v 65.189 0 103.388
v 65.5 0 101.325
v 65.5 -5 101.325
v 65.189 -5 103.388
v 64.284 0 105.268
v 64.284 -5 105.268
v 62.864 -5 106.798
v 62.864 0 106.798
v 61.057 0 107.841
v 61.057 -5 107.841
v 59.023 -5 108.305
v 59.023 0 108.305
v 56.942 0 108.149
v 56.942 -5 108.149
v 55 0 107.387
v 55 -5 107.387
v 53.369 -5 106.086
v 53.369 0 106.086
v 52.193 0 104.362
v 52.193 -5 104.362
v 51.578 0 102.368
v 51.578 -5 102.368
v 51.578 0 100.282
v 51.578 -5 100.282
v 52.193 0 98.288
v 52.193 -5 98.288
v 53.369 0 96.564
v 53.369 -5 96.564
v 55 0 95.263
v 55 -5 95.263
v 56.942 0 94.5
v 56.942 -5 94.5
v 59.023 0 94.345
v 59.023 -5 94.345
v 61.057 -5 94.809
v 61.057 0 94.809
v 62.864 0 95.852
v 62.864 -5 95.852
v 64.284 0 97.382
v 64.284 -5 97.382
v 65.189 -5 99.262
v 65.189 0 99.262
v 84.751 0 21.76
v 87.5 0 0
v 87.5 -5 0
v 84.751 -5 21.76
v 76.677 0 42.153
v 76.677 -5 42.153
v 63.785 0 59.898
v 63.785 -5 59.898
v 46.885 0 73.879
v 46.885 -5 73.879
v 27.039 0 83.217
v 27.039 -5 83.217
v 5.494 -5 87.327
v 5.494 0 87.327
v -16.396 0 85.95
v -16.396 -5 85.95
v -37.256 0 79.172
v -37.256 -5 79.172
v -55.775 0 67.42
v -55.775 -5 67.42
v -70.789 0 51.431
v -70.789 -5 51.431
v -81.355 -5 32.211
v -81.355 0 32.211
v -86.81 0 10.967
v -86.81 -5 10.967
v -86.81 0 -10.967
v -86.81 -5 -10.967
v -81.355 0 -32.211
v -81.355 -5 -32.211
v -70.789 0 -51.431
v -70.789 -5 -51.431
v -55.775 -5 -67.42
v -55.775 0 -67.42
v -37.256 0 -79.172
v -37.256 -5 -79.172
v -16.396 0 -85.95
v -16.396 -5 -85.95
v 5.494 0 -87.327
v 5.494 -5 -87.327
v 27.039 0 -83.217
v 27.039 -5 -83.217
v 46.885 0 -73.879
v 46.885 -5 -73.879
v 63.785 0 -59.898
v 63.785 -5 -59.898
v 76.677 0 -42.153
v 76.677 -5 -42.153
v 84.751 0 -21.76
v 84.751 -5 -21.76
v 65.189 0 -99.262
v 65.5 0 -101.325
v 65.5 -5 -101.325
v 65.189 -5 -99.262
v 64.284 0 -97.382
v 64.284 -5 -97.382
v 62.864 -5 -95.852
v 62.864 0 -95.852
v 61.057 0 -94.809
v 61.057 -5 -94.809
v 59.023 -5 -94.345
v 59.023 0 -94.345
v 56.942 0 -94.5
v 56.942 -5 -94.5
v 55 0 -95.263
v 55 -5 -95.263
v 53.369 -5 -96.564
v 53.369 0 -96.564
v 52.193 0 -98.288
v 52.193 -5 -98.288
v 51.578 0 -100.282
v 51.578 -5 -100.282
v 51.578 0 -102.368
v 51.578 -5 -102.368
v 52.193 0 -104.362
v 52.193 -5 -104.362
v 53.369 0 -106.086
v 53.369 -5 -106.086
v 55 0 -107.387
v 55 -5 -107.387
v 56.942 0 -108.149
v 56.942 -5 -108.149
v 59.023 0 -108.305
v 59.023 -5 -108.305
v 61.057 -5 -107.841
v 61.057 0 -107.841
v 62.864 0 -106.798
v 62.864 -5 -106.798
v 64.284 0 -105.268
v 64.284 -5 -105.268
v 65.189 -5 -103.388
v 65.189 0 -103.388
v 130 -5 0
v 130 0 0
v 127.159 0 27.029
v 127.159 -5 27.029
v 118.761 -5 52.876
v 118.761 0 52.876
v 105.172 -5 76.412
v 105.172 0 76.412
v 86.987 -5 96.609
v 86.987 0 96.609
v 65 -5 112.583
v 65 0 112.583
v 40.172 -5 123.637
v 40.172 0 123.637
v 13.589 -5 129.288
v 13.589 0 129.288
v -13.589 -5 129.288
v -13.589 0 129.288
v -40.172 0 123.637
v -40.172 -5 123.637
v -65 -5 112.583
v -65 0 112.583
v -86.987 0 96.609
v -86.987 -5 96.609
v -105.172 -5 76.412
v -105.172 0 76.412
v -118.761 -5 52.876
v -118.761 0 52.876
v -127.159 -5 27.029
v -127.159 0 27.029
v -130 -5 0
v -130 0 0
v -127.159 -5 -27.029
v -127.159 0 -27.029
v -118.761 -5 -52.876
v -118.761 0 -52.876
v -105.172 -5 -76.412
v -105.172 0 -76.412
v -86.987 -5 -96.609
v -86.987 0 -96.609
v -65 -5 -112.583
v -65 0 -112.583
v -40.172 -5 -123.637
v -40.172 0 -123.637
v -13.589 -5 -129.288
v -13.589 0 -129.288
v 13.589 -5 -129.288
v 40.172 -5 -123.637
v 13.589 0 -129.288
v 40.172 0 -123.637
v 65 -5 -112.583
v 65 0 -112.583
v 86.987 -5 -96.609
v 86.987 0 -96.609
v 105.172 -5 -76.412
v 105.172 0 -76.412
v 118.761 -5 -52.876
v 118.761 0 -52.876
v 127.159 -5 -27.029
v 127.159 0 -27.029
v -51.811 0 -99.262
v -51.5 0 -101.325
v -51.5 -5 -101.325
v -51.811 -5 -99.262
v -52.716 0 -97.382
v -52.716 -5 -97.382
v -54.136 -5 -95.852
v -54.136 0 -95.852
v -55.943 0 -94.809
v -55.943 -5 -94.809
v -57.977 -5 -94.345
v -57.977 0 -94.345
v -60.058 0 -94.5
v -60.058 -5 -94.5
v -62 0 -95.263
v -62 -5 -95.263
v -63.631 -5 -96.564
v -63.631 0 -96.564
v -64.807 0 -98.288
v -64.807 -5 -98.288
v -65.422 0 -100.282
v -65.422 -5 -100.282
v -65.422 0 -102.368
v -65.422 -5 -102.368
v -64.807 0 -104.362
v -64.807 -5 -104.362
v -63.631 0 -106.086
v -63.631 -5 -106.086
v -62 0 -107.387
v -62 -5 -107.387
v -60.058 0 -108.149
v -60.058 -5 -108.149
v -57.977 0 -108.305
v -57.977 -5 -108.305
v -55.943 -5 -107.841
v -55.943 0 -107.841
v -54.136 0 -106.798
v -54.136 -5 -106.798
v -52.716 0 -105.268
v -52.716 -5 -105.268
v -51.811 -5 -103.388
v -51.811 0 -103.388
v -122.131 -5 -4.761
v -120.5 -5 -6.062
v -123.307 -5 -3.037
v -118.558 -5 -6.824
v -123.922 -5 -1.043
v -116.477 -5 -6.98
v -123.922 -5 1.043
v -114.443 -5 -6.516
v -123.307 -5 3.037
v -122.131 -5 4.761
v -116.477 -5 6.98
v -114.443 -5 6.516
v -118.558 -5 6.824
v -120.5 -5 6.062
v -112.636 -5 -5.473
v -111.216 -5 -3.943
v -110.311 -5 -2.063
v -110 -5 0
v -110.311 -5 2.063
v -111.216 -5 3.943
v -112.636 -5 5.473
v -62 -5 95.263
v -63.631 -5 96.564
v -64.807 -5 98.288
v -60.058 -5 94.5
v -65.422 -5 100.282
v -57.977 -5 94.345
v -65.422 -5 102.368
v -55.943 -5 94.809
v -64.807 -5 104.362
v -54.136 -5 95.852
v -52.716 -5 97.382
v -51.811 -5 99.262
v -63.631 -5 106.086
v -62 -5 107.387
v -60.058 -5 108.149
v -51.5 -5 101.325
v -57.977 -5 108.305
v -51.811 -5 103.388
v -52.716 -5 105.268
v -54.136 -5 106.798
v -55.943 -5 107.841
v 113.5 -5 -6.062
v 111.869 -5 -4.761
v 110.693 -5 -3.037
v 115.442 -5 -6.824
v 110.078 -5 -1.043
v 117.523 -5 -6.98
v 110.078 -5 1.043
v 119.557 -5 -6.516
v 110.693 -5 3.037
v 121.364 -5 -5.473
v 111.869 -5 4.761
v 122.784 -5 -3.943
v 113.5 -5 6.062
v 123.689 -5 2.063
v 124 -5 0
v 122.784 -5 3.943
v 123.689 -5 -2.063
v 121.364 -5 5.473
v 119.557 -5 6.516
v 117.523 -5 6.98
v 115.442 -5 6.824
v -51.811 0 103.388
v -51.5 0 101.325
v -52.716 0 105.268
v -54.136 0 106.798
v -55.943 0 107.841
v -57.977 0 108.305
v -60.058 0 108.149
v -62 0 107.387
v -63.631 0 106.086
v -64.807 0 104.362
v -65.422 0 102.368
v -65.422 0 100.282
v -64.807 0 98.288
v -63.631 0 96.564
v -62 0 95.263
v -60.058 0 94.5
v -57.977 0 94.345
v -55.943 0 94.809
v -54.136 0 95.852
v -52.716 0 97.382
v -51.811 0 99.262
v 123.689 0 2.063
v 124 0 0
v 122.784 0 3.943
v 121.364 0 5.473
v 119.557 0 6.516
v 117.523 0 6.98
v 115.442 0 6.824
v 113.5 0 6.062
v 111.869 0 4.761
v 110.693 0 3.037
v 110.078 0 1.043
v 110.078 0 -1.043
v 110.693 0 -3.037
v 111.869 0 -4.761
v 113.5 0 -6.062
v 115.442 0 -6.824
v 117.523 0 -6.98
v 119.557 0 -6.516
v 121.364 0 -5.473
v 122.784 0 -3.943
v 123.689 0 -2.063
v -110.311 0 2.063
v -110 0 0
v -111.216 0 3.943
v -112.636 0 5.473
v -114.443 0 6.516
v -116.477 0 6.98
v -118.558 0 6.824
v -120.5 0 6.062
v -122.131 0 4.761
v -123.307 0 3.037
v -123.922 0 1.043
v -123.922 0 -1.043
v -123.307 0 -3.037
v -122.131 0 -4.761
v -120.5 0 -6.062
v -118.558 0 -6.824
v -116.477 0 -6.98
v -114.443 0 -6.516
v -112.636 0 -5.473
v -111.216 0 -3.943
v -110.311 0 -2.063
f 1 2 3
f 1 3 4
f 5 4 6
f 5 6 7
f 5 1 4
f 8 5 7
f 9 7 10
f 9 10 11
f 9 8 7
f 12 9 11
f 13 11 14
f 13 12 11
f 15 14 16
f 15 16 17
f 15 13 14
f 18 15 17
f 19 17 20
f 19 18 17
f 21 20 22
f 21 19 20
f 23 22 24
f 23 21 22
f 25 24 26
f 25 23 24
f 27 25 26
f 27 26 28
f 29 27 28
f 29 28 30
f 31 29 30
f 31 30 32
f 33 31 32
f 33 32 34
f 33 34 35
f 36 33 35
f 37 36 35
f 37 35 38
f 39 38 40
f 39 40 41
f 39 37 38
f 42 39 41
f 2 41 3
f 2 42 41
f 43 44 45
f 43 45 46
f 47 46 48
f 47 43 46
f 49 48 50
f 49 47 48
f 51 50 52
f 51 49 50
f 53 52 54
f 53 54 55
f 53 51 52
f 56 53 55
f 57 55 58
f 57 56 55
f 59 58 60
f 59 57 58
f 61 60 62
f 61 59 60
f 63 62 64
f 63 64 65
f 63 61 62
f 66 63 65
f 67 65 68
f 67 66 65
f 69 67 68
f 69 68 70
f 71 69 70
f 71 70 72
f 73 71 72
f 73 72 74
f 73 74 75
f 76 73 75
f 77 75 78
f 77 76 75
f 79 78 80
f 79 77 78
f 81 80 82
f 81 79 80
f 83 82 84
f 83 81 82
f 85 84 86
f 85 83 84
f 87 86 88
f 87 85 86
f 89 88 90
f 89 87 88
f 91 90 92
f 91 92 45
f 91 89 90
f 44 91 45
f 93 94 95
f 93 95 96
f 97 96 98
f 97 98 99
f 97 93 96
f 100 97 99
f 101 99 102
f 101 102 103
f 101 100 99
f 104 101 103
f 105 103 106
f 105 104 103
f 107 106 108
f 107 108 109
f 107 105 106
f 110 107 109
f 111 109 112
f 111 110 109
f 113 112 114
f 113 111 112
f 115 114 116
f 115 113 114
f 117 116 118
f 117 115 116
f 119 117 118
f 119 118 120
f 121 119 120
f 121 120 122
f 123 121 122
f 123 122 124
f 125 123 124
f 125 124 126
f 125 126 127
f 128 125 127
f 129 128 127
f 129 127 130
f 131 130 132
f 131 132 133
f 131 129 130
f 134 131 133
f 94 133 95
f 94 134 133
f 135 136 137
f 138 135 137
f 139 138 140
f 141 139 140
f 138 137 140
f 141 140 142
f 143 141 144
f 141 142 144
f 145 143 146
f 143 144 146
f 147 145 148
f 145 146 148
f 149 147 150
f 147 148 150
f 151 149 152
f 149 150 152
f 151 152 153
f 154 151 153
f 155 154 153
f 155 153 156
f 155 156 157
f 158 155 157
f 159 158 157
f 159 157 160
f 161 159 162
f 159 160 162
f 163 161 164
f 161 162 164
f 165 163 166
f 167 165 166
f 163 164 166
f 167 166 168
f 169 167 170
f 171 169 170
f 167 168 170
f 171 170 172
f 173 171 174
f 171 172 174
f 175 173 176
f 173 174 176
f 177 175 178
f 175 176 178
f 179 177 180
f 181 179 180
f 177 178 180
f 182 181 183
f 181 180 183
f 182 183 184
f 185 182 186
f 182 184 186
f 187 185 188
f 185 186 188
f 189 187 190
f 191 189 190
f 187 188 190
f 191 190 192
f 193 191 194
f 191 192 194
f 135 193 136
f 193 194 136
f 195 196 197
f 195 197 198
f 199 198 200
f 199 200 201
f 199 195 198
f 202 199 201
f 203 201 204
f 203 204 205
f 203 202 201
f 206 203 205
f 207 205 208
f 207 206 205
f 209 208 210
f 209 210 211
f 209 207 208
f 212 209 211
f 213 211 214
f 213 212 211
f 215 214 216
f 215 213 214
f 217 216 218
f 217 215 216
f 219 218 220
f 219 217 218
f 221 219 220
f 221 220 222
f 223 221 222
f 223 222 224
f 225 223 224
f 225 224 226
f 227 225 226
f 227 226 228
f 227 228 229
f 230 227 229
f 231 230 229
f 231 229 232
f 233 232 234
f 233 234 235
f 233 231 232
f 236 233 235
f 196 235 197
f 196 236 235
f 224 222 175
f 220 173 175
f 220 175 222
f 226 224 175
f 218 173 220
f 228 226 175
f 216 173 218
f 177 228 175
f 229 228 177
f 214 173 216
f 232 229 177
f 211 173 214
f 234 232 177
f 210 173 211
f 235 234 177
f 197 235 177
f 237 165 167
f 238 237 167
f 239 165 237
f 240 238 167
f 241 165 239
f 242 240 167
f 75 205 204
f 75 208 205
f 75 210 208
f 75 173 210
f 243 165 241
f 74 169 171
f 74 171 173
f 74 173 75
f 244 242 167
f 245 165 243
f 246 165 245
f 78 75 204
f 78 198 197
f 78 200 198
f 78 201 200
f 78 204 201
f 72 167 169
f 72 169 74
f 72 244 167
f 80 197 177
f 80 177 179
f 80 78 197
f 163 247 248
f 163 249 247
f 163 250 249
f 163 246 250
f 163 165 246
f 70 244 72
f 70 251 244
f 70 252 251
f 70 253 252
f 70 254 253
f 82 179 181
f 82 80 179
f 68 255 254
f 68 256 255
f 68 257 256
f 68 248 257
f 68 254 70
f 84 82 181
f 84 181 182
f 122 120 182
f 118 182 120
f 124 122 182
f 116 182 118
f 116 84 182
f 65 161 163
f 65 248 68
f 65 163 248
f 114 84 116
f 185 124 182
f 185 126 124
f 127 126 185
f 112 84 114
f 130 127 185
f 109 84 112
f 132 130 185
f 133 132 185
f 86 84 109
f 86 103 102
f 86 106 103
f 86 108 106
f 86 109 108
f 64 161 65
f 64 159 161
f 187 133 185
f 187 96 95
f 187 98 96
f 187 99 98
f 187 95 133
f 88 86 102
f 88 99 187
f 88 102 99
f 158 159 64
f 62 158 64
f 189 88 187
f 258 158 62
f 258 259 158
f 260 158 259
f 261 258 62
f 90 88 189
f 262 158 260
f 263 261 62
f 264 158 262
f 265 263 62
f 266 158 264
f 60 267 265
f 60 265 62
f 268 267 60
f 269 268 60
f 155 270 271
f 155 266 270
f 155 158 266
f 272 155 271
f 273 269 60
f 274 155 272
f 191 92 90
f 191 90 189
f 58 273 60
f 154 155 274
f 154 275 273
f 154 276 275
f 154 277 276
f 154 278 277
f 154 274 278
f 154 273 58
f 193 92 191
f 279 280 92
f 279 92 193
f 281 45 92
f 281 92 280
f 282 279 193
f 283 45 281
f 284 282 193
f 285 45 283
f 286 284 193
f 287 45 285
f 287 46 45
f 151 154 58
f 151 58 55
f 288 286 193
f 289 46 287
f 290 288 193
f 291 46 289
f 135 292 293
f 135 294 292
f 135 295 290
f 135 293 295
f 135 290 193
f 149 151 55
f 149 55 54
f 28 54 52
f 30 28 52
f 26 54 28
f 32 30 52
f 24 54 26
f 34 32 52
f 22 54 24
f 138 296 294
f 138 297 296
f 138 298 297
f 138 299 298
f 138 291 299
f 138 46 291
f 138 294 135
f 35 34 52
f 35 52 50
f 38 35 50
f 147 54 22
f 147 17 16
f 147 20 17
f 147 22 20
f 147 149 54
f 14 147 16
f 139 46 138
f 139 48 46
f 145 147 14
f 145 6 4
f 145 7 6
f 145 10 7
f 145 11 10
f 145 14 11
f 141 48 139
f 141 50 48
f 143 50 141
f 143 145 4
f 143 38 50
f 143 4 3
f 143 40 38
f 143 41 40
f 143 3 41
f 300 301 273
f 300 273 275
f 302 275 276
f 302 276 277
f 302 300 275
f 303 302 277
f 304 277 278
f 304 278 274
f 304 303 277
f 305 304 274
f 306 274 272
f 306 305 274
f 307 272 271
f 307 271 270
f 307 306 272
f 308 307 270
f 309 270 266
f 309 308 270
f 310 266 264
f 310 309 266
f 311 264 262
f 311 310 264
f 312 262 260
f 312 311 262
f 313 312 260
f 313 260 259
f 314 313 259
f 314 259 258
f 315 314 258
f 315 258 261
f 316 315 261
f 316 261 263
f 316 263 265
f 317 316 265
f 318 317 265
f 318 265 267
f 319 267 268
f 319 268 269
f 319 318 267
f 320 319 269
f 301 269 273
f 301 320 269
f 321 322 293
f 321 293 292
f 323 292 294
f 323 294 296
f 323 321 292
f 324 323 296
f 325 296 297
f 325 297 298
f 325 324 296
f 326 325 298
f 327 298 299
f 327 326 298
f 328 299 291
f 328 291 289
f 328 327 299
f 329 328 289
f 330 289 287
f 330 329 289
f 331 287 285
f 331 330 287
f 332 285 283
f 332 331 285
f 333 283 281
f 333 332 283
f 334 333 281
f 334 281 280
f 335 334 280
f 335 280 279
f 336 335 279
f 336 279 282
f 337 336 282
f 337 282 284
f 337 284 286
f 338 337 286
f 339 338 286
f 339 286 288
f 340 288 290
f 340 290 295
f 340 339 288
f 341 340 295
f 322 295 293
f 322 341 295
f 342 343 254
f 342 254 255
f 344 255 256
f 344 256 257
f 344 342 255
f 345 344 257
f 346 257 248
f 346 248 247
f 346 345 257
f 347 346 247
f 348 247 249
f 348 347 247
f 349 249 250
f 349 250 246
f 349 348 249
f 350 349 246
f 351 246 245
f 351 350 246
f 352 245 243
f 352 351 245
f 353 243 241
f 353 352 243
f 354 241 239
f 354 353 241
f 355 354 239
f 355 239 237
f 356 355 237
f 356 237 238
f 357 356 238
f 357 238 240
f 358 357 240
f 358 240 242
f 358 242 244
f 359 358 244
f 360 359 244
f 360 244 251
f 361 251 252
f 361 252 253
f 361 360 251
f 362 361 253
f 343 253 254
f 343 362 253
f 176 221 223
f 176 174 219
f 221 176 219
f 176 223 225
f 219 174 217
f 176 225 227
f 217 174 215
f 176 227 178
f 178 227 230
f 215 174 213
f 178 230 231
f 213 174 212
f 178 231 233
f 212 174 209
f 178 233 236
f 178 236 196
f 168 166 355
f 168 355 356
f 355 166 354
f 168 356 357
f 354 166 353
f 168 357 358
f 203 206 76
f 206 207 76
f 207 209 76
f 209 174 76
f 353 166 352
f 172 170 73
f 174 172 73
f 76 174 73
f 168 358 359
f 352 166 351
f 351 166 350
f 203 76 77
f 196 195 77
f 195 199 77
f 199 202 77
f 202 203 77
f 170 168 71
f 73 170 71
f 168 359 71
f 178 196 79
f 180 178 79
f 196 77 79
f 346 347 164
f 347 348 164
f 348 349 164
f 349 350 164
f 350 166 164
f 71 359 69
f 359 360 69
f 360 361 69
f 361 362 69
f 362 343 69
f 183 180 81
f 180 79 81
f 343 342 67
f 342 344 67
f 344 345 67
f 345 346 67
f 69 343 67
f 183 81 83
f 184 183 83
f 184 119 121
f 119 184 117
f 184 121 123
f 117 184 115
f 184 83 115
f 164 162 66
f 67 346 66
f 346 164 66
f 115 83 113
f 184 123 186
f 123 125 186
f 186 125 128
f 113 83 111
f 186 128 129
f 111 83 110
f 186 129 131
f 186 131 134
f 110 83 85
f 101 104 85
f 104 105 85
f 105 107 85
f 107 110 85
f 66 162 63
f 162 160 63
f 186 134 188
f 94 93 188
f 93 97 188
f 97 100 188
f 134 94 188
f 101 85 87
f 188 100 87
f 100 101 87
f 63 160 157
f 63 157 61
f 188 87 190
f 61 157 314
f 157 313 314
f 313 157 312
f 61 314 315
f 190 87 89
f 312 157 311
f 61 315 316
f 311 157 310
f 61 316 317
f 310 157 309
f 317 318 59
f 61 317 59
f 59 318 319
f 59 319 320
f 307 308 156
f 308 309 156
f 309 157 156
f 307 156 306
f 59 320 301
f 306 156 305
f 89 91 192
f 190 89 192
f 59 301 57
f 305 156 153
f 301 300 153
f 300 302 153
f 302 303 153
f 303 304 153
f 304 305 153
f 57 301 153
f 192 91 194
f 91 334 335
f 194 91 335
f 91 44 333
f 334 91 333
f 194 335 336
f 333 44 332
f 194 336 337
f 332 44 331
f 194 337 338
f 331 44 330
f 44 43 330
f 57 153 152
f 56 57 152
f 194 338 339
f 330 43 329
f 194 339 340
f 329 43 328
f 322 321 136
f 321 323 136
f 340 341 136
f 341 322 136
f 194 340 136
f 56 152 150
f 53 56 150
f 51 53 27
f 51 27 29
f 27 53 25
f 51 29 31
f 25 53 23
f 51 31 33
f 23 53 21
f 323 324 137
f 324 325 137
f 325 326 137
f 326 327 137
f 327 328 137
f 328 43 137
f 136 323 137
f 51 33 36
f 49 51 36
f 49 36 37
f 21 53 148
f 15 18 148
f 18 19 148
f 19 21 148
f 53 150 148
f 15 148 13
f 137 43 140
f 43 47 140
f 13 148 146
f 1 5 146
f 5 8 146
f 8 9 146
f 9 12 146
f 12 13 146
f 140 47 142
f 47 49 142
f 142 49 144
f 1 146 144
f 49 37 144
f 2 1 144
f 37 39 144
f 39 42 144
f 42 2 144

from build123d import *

# Parameters (mm, degrees)
F0_R     = 130
F0_R_2   = 7
F0_R_3   = 87.5
F1_DEPTH = 5


with BuildPart() as f1:
    # F0 (on Front) → F1 (new body)
    with BuildSketch(Plane.XZ):
        Circle(F0_R)
        with Locations((-58.5, -101.324972)):
            Circle(F0_R_2, mode=Mode.SUBTRACT)
        with Locations((58.5, -101.324972)):
            Circle(F0_R_2, mode=Mode.SUBTRACT)
        with Locations((-117, 0)):
            Circle(F0_R_2, mode=Mode.SUBTRACT)
        with Locations((-58.5, 101.324972)):
            Circle(F0_R_2, mode=Mode.SUBTRACT)
        Circle(F0_R_3, mode=Mode.SUBTRACT)
        with Locations((117, 0)):
            Circle(F0_R_2, mode=Mode.SUBTRACT)
        with Locations((58.5, 101.324972)):
            Circle(F0_R_2, mode=Mode.SUBTRACT)
    extrude(amount=F1_DEPTH)


solid = f1.part
